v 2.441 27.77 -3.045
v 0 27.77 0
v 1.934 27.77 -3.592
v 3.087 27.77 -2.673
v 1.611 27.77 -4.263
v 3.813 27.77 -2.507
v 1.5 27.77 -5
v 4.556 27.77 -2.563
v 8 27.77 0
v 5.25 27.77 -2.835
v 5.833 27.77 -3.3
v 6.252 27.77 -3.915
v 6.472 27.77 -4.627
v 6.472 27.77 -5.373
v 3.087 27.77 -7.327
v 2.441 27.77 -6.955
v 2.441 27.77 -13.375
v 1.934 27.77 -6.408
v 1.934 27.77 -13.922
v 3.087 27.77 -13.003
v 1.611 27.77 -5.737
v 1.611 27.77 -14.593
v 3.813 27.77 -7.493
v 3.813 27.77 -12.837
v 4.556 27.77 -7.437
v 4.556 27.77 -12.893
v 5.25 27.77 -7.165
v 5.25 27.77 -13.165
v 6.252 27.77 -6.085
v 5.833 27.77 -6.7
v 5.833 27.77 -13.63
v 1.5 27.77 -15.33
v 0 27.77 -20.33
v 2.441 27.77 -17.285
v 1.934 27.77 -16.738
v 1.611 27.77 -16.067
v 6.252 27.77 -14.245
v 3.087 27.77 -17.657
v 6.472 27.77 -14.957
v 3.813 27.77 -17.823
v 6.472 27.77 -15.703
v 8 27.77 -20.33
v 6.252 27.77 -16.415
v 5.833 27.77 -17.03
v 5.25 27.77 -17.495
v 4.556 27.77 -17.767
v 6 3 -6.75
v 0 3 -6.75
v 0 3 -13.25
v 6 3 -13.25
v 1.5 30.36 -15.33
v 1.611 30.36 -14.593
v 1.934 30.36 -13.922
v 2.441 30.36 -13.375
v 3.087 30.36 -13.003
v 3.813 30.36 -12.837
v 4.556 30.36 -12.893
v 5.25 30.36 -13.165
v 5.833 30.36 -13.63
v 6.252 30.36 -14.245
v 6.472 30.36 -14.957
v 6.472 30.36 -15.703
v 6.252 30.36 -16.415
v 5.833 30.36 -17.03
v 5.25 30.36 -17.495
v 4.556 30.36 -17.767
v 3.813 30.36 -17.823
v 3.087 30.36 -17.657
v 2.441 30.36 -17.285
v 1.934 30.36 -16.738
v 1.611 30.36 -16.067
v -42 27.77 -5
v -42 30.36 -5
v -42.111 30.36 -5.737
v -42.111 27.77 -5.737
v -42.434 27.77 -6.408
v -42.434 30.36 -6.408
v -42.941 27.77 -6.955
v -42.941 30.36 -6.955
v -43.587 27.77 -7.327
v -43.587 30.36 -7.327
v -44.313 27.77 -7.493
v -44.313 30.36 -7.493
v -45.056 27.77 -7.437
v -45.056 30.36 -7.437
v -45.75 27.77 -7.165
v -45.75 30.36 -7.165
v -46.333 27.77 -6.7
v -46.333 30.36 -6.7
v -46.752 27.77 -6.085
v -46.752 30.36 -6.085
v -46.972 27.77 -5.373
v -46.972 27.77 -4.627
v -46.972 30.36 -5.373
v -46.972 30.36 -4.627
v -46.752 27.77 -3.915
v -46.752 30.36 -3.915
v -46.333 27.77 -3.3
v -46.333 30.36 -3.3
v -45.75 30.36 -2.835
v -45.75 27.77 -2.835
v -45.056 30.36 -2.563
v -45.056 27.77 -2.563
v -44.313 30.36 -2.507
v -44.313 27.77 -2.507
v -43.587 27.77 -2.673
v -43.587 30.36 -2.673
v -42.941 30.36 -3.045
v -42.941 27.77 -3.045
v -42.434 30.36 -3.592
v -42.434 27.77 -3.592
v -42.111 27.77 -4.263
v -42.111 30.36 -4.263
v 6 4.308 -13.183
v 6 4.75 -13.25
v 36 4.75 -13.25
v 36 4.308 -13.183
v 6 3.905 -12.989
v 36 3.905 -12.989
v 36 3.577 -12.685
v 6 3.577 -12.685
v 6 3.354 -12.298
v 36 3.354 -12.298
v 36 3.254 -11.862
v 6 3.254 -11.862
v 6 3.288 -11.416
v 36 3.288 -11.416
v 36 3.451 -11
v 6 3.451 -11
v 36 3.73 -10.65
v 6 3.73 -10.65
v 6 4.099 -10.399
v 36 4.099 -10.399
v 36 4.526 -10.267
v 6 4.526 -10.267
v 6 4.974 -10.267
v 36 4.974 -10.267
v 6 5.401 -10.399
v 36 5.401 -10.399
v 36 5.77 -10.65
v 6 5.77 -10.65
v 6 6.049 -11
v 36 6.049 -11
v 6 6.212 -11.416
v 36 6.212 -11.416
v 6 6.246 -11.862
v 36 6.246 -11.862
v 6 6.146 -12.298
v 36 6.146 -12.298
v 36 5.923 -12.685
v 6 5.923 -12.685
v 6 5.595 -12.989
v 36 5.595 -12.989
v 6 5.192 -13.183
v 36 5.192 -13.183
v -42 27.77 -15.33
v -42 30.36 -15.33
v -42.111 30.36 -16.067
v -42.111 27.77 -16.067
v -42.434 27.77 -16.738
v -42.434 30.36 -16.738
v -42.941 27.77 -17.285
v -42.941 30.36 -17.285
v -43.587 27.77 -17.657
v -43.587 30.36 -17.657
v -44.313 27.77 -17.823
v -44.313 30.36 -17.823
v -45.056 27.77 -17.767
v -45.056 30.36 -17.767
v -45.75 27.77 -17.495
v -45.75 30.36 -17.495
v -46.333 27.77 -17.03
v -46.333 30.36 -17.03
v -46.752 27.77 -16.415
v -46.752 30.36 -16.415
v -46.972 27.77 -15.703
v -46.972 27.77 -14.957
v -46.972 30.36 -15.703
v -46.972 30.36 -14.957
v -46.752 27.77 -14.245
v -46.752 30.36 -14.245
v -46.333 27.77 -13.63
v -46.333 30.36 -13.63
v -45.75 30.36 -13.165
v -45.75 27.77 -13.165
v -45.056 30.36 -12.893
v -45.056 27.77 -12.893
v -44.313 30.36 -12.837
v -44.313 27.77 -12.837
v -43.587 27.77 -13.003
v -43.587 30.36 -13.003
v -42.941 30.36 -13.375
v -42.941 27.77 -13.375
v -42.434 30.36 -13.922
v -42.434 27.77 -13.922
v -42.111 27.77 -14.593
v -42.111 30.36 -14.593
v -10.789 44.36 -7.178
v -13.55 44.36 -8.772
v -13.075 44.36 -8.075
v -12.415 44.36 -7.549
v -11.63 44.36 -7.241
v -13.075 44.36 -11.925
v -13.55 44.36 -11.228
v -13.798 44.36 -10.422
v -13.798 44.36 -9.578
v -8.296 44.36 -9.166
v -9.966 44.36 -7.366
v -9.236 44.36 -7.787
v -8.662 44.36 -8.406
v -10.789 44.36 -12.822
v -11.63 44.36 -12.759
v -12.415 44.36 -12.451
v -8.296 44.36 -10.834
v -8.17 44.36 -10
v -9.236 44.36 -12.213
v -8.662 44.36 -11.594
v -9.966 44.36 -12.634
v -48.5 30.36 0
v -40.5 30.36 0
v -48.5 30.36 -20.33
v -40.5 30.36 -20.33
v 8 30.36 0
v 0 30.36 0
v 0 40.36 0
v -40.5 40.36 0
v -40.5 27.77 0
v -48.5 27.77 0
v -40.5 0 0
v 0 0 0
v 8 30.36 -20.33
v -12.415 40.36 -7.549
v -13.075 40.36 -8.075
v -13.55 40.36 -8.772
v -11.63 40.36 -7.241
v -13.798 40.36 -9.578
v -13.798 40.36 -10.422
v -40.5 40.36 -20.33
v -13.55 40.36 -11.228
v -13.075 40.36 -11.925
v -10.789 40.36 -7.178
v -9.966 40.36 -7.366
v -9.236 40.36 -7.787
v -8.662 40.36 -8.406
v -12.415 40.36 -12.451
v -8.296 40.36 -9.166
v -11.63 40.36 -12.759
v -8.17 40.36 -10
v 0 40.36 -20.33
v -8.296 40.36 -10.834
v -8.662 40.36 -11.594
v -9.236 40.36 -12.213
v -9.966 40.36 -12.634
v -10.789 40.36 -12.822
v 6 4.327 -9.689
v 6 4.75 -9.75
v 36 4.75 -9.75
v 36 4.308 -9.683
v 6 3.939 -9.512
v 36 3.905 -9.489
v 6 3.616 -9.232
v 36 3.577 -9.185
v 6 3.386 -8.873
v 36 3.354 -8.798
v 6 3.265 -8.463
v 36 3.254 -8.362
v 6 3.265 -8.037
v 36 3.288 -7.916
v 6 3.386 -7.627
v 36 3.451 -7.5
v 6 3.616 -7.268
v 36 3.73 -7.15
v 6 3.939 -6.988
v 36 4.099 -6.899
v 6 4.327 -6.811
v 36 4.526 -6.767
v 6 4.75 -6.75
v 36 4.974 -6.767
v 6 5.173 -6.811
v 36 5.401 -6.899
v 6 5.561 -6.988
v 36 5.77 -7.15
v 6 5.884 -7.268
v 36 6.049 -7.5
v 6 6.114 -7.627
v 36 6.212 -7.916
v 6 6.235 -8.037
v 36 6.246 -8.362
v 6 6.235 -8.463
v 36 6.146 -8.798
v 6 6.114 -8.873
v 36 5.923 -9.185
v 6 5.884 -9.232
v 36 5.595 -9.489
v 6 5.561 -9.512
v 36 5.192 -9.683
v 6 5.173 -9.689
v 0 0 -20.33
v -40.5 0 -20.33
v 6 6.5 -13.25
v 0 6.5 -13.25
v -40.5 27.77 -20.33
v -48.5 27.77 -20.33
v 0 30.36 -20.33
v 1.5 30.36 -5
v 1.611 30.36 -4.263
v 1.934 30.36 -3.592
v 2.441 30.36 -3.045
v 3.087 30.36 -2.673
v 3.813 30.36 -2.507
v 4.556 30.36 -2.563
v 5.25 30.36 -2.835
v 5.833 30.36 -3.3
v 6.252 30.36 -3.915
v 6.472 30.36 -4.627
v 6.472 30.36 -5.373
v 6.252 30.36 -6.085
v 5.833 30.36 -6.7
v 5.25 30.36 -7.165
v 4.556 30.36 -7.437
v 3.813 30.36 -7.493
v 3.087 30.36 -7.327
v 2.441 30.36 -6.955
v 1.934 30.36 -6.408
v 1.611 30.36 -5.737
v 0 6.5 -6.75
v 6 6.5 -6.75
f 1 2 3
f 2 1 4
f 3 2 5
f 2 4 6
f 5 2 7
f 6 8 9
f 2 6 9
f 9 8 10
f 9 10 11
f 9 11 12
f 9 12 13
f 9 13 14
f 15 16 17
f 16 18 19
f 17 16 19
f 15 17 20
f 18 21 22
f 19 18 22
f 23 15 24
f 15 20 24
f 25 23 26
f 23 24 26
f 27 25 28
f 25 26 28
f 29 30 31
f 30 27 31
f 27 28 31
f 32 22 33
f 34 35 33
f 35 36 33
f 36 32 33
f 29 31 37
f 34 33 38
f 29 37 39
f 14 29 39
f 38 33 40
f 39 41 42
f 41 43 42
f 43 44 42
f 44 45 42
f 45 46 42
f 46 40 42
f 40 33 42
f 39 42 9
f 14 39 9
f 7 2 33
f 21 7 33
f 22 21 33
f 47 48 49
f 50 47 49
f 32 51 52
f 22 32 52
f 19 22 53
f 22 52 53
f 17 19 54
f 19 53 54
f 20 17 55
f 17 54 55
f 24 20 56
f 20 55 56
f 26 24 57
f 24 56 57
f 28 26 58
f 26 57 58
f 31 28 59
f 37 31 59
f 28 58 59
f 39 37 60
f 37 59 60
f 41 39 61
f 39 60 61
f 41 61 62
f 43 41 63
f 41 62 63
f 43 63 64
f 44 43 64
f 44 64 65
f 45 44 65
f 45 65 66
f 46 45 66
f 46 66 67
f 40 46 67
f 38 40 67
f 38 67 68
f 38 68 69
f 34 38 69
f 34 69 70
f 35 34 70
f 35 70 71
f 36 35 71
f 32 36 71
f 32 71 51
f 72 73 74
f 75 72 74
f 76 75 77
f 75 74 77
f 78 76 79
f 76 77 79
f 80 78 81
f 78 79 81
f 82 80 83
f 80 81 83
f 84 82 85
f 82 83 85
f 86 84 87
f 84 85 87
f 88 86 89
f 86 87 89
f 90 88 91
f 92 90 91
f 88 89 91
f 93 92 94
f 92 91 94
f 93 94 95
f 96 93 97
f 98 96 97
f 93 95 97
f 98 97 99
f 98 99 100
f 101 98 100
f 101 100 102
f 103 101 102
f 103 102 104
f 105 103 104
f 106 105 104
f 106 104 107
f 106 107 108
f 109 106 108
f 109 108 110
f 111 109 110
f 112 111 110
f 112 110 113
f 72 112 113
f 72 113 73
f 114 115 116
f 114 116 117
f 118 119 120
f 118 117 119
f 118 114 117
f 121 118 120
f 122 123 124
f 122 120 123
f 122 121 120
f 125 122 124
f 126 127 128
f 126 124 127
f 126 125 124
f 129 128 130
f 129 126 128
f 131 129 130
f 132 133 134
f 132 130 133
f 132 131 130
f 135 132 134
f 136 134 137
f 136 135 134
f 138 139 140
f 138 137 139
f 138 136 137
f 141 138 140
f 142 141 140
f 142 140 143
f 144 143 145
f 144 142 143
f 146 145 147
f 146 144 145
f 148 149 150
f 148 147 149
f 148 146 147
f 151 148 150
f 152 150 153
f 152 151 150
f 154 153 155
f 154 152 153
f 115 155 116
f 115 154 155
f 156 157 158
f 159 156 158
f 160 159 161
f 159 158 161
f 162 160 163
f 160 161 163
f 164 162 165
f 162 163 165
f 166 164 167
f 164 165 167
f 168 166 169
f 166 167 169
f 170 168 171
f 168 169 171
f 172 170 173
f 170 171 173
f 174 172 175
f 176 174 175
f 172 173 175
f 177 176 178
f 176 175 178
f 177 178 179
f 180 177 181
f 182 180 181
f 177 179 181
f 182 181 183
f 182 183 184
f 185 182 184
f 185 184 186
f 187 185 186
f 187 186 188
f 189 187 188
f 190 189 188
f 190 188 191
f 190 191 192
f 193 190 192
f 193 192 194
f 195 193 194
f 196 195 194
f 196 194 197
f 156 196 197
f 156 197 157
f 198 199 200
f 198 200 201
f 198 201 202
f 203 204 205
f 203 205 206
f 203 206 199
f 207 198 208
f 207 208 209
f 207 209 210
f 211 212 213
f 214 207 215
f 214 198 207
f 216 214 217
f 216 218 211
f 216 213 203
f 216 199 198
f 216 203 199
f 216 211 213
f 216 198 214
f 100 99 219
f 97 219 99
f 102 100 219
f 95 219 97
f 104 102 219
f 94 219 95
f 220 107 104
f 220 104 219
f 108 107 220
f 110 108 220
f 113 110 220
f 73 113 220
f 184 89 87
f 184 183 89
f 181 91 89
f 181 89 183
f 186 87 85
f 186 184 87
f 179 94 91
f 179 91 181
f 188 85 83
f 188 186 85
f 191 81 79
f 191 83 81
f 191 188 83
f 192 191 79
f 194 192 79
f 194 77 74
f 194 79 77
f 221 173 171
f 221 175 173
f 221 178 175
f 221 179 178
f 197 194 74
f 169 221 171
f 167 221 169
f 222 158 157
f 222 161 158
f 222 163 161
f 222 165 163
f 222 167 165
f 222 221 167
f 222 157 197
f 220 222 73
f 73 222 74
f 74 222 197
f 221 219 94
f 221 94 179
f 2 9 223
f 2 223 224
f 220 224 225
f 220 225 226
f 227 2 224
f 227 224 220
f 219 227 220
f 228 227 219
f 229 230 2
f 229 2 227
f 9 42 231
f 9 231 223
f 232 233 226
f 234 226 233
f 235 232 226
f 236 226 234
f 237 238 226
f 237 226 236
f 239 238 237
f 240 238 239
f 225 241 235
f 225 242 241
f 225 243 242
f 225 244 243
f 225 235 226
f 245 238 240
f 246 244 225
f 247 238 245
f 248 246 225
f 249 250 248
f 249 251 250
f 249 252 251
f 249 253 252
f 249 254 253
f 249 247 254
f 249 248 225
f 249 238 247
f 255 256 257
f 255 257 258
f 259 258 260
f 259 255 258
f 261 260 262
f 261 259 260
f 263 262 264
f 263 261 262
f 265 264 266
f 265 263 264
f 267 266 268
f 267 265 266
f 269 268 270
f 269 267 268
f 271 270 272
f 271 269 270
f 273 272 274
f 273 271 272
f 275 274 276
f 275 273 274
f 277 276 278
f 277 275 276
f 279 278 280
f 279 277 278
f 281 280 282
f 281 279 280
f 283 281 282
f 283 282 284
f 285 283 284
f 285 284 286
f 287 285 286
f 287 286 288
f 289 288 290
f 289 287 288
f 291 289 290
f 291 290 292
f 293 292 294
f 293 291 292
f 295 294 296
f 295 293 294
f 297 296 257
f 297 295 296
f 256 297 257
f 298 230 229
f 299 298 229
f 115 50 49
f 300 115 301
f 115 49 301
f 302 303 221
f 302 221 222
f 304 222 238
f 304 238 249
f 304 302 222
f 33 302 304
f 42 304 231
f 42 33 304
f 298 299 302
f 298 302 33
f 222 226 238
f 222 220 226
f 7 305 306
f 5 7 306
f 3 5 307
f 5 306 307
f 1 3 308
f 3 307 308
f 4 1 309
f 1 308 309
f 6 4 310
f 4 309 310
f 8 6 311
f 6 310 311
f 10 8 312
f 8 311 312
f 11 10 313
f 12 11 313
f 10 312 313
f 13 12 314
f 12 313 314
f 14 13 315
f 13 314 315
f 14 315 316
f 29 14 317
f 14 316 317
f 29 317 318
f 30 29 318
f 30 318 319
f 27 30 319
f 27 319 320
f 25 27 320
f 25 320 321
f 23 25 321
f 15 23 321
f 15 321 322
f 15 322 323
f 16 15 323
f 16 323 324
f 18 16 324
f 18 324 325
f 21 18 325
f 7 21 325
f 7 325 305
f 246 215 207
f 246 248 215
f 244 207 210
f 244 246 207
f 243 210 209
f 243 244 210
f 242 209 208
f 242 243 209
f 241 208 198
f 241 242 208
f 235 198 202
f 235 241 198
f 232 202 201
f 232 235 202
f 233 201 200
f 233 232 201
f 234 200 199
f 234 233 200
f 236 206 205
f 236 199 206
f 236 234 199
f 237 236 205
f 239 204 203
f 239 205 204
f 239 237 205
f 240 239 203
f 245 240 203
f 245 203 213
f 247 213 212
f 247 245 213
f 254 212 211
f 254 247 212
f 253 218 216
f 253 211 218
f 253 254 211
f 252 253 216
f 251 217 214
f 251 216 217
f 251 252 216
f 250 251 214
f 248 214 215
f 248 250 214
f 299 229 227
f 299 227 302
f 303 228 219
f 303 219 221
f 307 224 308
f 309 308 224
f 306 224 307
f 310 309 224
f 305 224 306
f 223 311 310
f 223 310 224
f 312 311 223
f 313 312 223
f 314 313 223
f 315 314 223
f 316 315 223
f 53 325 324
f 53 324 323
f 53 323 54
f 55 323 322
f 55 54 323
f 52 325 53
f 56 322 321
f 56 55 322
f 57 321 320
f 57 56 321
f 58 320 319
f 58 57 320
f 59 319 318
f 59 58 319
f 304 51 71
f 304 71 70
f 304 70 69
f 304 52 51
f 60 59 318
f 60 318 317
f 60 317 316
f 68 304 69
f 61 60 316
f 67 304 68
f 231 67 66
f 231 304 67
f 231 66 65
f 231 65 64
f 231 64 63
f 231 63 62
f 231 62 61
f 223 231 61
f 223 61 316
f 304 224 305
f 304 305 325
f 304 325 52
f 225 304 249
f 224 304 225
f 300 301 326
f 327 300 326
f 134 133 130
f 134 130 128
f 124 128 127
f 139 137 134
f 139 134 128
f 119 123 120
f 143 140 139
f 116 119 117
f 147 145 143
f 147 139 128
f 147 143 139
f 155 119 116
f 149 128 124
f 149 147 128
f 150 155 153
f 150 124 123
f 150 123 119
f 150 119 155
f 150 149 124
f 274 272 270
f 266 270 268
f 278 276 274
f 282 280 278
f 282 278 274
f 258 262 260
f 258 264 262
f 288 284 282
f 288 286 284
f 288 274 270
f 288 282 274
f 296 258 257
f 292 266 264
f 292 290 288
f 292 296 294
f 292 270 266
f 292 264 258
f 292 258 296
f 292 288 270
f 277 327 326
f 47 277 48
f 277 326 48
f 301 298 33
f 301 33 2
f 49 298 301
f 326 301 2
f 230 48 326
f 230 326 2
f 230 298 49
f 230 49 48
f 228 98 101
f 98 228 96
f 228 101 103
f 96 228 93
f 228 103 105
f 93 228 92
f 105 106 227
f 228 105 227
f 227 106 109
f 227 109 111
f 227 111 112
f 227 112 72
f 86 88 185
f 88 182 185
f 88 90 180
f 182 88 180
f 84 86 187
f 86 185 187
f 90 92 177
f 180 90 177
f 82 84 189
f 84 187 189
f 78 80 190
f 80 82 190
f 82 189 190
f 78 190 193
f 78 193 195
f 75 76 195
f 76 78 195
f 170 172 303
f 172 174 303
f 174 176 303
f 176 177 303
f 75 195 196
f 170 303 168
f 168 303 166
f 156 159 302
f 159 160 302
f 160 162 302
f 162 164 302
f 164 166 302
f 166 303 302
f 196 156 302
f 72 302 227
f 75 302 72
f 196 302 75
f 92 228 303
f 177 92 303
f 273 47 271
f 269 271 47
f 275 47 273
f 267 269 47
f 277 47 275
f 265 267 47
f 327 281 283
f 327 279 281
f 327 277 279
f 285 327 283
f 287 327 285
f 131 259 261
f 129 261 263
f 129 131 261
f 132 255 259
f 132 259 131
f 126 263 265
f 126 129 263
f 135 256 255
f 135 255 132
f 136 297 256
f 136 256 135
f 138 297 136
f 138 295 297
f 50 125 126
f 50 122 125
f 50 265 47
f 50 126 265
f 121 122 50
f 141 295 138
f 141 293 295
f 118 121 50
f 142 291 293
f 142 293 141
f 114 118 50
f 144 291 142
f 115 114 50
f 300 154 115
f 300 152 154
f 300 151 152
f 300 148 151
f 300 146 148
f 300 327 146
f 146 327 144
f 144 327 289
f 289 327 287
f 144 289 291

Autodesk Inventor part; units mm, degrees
ref_plane "YZ Plane" through (0, 0, 0) normal (1, 0, 0) x (0, 1, 0)
ref_plane "XZ Plane" through (0, 0, 0) normal (0, 1, 0) x (-1, 0, 0)
ref_plane "XY Plane" through (0, 0, 0) normal (0, 0, 1) x (1, 0, 0)
sketch "Sketch1" plane through (0, 0, 0) normal (0, 1, 0) x (-1, 0, 0)
  line L0 (0, 0) -> (40.5, 0)
  line L1 (40.5, 0) -> (40.5, -20.33)
  line L2 (40.5, -20.33) -> (0, -20.33)
  line L3 (0, -20.33) -> (0, 0)
  dimension "d0" = 20.33
  dimension "d1" = 40.5
extrude "Extrusion1" add sketch "Sketch1" along normal blind 27.77
sketch "Sketch2" plane through (0, 27.77, 0) normal (0, 1, 0) x (1, 0, 0)
  line L0 (8, 0) -> (-48.5, 0)
  line L1 (-48.5, 0) -> (-48.5, 20.33)
  line L2 (-48.5, 20.33) -> (8, 20.33)
  line L3 (8, 20.33) -> (8, 0)
  line L4 (0, 20.33) -> (-40.5, 20.33) projected
  line L5 (-40.5, 20.33) -> (-40.5, 0) projected
  line L6 (-40.5, 0) -> (0, 0) projected
  line L7 (0, 0) -> (0, 20.33) projected
  point P0 (-40.5, 20.33)
  dimension "d4" = 0
  dimension "d6" = 8
  dimension "d7" = 0
  dimension "d41" = 8
extrude "Extrusion2" add sketch "Sketch2" along normal blind 2.59
sketch "Sketch3" plane through (0, 30.36, 0) normal (0, 1, 0) x (1, 0, 0)
  circle A0 centre (-44.5, 5) radius 2.5
  circle A1 centre (-44.5, 15.33) radius 2.5
  line L0 (-48.5, 0) -> (8, 0) projected
  line L1 (8, 20.33) -> (-48.5, 20.33) projected
  line L2 (-48.5, 20.33) -> (-48.5, 0) projected
  point P0 (0, 0)
  dimension "d10" = 5
  dimension "d11" = 5
  dimension "d12" = 5
  dimension "d14" = 5
  dimension "d15" = 4
  dimension "d16" = 4
extrude "Extrusion3" cut sketch "Sketch3" against normal blind 3.5
ref_plane "Work Plane1" through (-20.25, 27.77, 0) normal (1, 0, 0) x (0, 0, -1)
mirror "Mirror1" about plane through (-20.25, 27.77, 0) normal (1, 0, 0) of "Extrusion3"
sketch "Sketch4" plane through (0, 30.36, 0) normal (0, 1, 0) x (1, 0, 0)
  line L0 (0, 0) -> (-40.5, 0)
  line L1 (-40.5, 0) -> (-40.5, 20.33)
  line L2 (-40.5, 20.33) -> (0, 20.33)
  line L3 (0, 20.33) -> (0, 0)
extrude "Extrusion4" add sketch "Sketch4" along normal blind 10
sketch "Sketch5" plane through (0, 40.36, 0) normal (0, 1, 0) x (1, 0, 0)
  circle A0 centre (-11, 10) radius 2.83
  line L0 (0, 0) -> (0, 20.33) projected
  line L1 (-40.5, 0) -> (0, 0) projected
  line L2 (-40.5, 20.33) -> (-40.5, 0) projected
  dimension "d22" = 10
  dimension "d23" = 5.66
  dimension "d42" = 11
extrude "Extrusion5" add sketch "Sketch5" along normal blind 4
sketch "Sketch6" plane through (0, 0, 0) normal (1, 0, 0) x (0, 0, -1)
  line L0 (6.75, 3) -> (13.25, 3)
  line L1 (13.25, 3) -> (13.25, 6.5)
  line L2 (13.25, 6.5) -> (6.75, 6.5)
  line L3 (6.75, 6.5) -> (6.75, 3)
  line L4 (0, 0) -> (20.33, 0) projected
  line L5 (0, 0) -> (0, 27.77) projected
  dimension "d26" = 3
  dimension "d27" = 6.5
  dimension "d28" = 3.5
  dimension "d29" = 6.75
extrude "Extrusion6" add sketch "Sketch6" along normal blind 6
sketch "Sketch7" plane through (6, 0, 0) normal (1, 0, 0) x (0, 0, -1)
  circle A0 centre (11.75, 4.75) radius 1.5
  circle A1 centre (8.25, 4.75) radius 1.5
  line L0 (6.75, 6.5) -> (6.75, 3) projected
  line L1 (13.25, 3) -> (13.25, 6.5) projected
  line L2 (6.75, 3) -> (13.25, 3) projected
  point P0 (0, 0)
  dimension "d32" = 3
  dimension "d33" = 3
  dimension "d34" = 1.5
  dimension "d35" = 1.5
  dimension "d36" = 1.75
  dimension "d37" = 1.75
extrude "Extrusion7" add sketch "Sketch7" along normal blind 30
equation "\"d16\" = d15"
equation "\"d33\" = d32"
equation "\"d37\" = d36"
properties part number "motor_25kg"
